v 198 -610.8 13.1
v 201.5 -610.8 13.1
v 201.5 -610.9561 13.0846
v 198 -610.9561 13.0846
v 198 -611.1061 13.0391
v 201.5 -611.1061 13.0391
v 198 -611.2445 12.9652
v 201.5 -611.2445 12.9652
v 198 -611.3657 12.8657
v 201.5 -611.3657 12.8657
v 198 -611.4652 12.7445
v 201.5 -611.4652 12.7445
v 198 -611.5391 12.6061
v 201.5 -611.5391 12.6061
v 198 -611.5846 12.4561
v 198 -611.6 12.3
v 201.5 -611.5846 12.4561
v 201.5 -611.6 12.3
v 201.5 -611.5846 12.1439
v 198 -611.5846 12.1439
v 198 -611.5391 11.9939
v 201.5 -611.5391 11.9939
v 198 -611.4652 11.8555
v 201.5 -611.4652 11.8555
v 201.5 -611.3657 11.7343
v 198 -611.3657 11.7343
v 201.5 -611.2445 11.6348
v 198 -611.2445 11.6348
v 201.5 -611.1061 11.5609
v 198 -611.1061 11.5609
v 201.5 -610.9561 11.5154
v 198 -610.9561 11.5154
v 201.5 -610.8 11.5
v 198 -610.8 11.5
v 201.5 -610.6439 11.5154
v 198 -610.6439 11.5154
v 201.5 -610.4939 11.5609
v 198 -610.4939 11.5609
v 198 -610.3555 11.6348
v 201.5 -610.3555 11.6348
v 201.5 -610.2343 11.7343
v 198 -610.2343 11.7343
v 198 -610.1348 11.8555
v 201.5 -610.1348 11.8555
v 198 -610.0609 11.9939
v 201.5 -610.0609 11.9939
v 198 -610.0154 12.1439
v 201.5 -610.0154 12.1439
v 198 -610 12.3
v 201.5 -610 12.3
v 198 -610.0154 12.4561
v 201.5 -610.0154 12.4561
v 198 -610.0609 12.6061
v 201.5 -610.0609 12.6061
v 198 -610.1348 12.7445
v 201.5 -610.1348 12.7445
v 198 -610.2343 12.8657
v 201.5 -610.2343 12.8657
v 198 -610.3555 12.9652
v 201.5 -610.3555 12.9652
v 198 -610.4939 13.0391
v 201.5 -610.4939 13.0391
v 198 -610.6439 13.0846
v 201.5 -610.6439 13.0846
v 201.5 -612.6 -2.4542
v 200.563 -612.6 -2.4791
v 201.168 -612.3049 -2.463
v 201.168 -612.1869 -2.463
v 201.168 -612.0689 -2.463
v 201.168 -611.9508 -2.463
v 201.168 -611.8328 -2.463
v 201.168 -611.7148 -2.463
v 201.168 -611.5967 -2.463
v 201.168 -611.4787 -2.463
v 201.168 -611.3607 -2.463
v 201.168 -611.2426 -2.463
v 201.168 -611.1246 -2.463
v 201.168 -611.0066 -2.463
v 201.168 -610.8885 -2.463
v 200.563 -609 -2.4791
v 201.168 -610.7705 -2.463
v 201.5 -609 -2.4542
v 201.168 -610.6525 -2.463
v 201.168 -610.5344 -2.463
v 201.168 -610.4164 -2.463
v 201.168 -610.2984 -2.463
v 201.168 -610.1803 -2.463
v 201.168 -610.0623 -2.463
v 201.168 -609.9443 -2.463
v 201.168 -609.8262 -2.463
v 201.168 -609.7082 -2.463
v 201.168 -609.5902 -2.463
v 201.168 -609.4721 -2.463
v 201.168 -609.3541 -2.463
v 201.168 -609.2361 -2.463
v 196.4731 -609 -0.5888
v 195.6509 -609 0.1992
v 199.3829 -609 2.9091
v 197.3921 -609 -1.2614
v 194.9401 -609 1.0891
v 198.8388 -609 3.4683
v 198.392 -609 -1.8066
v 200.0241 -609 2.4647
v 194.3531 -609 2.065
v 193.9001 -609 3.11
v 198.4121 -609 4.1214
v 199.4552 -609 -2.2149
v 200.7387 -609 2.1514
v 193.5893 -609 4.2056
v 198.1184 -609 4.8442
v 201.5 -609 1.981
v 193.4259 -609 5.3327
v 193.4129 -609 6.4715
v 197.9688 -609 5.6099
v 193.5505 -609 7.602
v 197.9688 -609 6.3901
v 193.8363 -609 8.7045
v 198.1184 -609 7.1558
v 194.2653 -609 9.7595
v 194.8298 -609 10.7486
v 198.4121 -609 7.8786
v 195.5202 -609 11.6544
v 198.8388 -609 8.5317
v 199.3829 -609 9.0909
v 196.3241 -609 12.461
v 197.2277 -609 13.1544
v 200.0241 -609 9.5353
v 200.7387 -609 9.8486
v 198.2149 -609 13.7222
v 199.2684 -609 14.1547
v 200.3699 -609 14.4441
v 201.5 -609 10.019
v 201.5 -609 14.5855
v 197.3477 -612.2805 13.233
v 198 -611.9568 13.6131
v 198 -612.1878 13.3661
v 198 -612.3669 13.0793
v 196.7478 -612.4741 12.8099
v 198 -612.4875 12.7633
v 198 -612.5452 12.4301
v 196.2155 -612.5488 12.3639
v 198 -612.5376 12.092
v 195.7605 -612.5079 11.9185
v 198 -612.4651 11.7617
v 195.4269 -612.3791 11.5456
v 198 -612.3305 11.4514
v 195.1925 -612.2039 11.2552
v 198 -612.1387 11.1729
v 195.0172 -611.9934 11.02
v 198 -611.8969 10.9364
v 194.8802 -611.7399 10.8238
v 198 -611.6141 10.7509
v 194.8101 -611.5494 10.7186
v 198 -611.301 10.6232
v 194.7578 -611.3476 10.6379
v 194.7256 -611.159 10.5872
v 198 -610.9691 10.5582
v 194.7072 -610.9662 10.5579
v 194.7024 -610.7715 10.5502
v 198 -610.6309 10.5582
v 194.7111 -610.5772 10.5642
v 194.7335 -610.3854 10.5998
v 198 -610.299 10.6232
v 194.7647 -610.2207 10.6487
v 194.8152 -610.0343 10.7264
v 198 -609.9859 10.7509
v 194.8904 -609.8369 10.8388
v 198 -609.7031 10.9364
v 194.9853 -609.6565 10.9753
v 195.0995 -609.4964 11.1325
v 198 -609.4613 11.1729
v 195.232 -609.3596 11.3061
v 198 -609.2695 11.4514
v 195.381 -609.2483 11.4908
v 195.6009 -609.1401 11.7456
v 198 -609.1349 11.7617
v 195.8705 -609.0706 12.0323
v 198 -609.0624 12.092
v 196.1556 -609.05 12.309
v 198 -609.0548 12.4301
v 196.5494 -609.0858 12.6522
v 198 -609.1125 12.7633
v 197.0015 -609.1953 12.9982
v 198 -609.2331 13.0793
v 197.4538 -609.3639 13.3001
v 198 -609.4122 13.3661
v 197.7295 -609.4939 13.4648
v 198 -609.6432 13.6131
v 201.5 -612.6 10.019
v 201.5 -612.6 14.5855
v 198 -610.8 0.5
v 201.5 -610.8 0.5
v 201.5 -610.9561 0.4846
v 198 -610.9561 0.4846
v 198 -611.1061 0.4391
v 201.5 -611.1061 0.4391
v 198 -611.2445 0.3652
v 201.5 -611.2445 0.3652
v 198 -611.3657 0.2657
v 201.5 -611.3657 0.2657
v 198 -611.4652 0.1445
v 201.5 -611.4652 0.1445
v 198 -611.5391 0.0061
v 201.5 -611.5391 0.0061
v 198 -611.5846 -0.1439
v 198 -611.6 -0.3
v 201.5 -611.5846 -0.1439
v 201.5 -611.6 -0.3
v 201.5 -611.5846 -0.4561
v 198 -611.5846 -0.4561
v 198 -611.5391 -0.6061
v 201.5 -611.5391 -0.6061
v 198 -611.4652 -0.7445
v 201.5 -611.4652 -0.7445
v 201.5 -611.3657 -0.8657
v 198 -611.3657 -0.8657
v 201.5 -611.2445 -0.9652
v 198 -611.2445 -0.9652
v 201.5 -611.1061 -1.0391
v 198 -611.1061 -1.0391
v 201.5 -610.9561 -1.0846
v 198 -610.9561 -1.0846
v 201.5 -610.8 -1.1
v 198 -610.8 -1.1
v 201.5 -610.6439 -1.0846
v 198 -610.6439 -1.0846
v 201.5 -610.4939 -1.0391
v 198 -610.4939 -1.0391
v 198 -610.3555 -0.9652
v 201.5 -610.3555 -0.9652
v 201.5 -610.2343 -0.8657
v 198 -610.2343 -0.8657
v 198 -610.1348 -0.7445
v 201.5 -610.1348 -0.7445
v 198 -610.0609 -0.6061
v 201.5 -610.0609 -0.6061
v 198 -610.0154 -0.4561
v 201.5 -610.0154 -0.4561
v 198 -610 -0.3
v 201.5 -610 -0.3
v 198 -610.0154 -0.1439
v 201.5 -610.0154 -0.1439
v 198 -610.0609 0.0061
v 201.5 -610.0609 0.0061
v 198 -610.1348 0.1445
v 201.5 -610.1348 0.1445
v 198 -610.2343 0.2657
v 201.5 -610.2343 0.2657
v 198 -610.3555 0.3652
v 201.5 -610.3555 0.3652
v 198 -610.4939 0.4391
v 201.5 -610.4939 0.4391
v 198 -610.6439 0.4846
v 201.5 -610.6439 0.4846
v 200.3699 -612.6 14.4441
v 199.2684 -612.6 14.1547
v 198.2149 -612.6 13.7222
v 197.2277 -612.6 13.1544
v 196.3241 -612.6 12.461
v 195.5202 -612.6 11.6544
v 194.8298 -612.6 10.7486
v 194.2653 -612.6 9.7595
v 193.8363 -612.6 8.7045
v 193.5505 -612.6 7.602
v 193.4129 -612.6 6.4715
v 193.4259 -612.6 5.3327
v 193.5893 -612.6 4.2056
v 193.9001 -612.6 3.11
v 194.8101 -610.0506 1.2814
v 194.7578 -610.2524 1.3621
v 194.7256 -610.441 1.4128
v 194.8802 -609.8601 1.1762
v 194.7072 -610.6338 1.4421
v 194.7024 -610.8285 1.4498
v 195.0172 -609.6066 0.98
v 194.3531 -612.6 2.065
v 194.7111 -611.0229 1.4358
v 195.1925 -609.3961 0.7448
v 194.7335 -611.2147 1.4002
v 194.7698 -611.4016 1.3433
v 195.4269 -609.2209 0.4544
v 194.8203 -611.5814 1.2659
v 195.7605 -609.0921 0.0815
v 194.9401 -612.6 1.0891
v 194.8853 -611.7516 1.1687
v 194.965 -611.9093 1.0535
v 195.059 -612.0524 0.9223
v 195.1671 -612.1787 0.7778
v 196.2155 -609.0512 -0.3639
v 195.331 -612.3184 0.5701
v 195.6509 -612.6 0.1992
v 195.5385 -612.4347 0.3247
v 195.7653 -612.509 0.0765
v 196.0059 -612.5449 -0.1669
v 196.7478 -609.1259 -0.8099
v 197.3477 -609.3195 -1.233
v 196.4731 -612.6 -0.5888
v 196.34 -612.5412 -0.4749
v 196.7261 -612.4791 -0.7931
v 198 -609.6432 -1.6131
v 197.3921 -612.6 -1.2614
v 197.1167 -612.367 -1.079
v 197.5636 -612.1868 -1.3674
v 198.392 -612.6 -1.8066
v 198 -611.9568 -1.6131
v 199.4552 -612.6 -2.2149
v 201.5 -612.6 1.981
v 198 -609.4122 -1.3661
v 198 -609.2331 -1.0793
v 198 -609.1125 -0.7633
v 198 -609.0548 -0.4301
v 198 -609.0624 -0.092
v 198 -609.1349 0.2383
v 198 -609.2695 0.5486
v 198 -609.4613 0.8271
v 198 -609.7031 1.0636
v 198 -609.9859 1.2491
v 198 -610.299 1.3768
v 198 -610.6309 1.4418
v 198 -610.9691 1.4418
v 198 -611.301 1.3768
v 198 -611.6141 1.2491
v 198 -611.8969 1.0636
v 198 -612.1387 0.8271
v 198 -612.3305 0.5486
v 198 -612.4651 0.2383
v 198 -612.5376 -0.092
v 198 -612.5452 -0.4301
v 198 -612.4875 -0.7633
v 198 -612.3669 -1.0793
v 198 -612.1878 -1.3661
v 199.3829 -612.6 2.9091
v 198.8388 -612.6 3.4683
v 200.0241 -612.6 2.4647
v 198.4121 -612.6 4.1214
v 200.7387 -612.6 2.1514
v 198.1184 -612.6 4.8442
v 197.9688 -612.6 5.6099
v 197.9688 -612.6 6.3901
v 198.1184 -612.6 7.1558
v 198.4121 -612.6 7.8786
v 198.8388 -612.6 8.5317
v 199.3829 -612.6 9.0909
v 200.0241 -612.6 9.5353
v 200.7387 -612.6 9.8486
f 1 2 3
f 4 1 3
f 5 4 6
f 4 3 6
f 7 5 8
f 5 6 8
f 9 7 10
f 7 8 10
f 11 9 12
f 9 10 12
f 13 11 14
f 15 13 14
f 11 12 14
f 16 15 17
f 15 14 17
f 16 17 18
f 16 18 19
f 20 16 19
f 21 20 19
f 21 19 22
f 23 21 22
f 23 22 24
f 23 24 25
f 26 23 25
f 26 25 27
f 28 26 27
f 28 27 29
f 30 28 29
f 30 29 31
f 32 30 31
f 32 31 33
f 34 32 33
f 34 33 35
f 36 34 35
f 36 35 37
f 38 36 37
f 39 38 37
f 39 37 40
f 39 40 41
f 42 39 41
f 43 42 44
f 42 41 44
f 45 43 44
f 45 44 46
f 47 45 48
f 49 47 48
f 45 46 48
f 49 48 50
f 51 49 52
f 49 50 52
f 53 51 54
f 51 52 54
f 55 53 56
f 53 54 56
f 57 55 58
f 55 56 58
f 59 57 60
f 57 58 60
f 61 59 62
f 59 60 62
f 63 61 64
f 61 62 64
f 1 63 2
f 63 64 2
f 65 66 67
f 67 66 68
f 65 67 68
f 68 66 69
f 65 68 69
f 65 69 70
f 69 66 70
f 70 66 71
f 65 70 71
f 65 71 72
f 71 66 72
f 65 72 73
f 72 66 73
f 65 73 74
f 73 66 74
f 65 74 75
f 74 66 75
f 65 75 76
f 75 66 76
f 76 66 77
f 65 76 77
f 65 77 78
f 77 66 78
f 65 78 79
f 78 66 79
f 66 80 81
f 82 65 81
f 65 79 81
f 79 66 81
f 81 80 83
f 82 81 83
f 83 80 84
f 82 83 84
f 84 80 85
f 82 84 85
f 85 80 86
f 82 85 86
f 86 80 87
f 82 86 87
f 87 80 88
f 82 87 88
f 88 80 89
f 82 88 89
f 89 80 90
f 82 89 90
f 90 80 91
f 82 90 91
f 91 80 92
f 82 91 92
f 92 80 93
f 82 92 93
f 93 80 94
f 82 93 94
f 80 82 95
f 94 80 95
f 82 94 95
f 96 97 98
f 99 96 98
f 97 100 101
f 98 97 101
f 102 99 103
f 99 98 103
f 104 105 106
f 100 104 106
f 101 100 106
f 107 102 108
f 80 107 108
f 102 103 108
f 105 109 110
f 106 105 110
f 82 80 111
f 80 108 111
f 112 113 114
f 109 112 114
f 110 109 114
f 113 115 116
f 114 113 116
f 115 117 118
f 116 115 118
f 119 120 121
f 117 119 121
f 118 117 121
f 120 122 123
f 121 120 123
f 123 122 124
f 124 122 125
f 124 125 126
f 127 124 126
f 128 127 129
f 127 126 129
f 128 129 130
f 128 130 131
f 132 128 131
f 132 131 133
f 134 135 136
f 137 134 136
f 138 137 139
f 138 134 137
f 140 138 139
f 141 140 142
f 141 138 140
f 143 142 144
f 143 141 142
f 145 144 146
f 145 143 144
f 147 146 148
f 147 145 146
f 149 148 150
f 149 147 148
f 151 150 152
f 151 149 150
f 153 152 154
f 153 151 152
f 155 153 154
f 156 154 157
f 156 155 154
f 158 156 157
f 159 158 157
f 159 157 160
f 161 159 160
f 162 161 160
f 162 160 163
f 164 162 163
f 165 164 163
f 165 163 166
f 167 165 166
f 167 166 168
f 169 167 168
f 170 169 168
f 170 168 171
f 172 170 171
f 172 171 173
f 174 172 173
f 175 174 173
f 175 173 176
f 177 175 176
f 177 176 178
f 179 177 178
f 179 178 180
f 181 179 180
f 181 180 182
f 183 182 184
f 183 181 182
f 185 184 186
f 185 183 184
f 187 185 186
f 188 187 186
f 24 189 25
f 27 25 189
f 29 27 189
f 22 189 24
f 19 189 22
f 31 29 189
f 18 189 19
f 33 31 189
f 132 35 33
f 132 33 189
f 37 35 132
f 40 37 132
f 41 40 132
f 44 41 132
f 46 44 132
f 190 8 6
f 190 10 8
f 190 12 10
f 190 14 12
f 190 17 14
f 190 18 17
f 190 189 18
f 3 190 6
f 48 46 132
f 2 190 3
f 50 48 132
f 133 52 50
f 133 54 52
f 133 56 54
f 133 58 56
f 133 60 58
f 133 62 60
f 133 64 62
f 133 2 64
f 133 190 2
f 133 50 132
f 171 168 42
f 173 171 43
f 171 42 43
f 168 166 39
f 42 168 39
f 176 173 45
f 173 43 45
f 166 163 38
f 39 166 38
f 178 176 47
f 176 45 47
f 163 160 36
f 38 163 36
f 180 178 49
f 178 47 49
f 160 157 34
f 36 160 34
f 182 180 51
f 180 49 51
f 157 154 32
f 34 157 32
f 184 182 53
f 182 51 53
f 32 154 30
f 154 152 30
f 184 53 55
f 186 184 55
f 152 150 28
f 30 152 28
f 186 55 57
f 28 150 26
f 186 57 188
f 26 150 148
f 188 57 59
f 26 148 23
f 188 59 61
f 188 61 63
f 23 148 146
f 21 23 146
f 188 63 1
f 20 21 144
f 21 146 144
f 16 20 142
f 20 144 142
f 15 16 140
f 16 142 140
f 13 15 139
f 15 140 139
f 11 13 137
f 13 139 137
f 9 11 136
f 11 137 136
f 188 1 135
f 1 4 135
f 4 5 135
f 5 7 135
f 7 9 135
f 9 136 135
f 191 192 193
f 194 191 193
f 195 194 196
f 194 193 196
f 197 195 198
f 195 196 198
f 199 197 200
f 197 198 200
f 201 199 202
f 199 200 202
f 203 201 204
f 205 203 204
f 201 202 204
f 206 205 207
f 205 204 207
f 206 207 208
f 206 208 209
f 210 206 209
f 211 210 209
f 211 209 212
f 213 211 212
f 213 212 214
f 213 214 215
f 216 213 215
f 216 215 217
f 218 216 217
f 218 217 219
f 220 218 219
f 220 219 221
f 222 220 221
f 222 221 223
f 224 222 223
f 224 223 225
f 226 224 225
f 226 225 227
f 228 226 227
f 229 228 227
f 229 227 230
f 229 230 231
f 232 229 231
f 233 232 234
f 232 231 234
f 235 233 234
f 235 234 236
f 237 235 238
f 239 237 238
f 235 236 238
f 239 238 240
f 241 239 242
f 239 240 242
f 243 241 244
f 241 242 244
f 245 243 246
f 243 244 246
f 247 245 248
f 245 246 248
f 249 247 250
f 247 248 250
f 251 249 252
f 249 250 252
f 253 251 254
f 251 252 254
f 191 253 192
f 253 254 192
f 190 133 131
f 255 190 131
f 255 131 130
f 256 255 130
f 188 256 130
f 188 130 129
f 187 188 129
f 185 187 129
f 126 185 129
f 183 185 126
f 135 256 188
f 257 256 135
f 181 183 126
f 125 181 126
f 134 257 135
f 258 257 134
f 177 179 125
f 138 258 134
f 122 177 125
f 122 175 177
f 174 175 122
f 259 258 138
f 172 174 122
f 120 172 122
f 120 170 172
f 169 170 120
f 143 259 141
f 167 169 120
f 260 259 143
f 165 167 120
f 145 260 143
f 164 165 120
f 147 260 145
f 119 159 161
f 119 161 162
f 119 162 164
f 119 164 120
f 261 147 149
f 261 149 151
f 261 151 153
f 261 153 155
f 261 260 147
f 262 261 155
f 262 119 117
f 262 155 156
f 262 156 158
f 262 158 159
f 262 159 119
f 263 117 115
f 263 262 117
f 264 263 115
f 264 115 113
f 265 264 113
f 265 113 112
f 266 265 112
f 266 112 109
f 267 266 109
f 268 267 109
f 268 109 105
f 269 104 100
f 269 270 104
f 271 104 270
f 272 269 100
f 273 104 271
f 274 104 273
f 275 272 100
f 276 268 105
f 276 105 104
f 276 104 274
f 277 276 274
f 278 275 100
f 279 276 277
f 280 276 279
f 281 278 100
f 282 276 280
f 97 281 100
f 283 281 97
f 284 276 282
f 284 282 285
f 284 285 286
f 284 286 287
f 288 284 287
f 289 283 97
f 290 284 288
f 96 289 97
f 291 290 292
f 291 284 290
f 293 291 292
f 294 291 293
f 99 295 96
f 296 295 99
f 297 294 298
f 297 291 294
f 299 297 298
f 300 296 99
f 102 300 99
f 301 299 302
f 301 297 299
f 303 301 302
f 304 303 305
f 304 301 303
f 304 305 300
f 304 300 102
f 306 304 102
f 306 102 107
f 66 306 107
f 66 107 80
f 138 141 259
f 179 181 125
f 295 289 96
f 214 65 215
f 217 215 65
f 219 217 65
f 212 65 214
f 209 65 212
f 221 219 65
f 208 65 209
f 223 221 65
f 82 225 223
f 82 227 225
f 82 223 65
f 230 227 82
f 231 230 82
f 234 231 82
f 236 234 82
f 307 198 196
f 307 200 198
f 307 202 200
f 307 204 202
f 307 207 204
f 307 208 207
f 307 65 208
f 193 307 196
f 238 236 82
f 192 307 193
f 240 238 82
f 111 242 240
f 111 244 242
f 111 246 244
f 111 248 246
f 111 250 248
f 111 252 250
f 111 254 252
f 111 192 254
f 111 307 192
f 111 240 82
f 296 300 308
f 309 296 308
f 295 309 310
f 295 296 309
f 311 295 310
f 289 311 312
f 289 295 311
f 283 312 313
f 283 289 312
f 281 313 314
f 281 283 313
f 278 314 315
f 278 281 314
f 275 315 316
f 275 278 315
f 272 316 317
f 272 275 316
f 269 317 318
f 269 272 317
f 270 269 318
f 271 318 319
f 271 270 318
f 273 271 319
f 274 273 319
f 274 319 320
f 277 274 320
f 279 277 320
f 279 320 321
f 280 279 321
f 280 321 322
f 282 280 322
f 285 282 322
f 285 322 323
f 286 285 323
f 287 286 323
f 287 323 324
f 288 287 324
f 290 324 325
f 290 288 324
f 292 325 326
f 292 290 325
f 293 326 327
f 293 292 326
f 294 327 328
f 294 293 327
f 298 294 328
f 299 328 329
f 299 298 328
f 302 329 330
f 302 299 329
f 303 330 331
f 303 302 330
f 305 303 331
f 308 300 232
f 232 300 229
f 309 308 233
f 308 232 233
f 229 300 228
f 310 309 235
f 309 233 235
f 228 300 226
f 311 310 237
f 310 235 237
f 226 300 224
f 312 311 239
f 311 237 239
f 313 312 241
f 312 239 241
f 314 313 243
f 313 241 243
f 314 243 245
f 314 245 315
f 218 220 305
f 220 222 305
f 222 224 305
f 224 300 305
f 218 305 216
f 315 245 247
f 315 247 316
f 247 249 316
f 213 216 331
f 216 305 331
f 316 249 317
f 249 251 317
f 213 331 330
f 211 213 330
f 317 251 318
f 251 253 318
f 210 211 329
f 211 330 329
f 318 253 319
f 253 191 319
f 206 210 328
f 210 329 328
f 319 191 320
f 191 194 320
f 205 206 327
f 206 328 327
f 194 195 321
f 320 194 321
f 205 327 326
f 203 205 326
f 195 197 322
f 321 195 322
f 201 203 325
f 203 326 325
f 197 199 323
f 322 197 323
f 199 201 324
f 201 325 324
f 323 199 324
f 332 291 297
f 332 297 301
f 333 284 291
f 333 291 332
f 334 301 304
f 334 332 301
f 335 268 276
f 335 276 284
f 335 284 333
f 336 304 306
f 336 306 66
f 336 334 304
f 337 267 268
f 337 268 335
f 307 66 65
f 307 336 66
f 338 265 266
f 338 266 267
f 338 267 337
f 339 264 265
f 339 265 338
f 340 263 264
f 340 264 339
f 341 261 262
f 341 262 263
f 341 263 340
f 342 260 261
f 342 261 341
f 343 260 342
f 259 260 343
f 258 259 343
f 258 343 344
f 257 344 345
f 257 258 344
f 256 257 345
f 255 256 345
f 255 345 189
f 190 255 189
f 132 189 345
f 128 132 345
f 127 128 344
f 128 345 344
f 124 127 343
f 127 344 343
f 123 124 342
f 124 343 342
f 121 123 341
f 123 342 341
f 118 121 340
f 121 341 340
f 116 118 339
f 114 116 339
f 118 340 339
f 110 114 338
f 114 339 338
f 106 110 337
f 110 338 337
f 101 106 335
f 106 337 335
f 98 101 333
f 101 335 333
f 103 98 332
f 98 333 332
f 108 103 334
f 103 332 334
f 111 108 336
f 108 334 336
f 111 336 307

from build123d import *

# Parameters (mm, degrees)
PAD114_DEPTH    = 3.6
SKETCH245_W     = 199.954956
SKETCH245_H     = 336.690071
POCKET129_DEPTH = 50
POCKET130_DEPTH = 300
SKETCH247_R     = 4.05
POCKET131_DEPTH = 5
SKETCH248_R     = 0.8
POCKET132_DEPTH = 10
SKETCH249_R     = 1.75
POCKET133_DEPTH = 4.5


with BuildPart() as part:
    # Sketch244 → Pad114 (new body)
    with BuildSketch(Plane.XZ):
        with BuildLine():
            add(Edge.make_bspline(
                [(299.999063, 0.026825), (299.662766, 0.037193), (298.339429, 0.190401), (295.439956, 0.589669), (290.775356, 1.337839), (284.500044, 2.393262), (276.735212, 3.66473), (267.577355, 5.083019), (257.136483, 6.653879), (245.549215, 8.381993), (232.975291, 10.222771), (219.590016, 12.153256), (205.573823, 14.115503), (191.111579, 16.055183), (176.381713, 17.897983), (161.544489, 19.553409), (146.739309, 20.940939), (132.087536, 21.99009), (117.705275, 22.664279), (103.703346, 22.961168), (90.192549, 22.858072), (77.284675, 22.375726), (65.094168, 21.544938), (53.730431, 20.369385), (43.29002, 18.857963), (33.852484, 17.043697), (25.485501, 14.967735), (18.252292, 12.67281), (12.179436, 10.224412), (7.338355, 7.689021), (3.623023, 5.152403), (1.3546, 2.748114), (-0.314638, 0.590402), (0.575789, -1.804065), (3.482069, -2.72942), (7.386052, -3.91761), (13.030922, -4.754284), (20.096342, -5.463024), (28.645402, -5.933379), (38.56853, -6.201185), (49.790194, -6.284208), (62.196701, -6.193111), (75.660953, -5.967607), (90.034637, -5.629522), (105.153445, -5.226063), (120.83724, -4.775199), (136.895942, -4.296045), (153.13493, -3.818601), (169.356828, -3.345106), (185.36574, -2.889379), (200.968742, -2.465331), (215.974941, -2.074889), (230.201502, -1.715375), (243.47905, -1.394255), (255.639348, -1.103787), (266.55871, -0.849968), (276.034544, -0.603524), (284.209012, -0.340437), (290.324953, -0.117215), (295.955653, 0.018504), (297.364702, 0.013759), (300.343856, 0.01512), (300.000055, 0.026794), (299.999063, 0.026825)],
                knots=[0, 0, 0, 0, 1.017748, 3.99659, 8.779341, 15.189917, 23.087031, 32.383824, 42.990765, 54.76218, 67.530065, 81.114584, 95.333435, 109.988542, 124.889458, 139.866624, 154.774633, 169.496697, 183.930349, 197.964304, 211.506735, 224.45797, 236.709214, 248.156653, 258.723012, 268.346769, 276.97692, 284.567784, 291.102108, 296.573756, 300.992679, 304.39163, 306.761357, 308.43213, 311.131254, 315.298227, 320.951765, 328.080828, 336.654655, 346.609821, 357.866231, 370.316475, 383.83025, 398.264023, 413.449345, 429.202773, 445.334827, 461.646891, 477.940787, 494.021253, 509.693044, 524.767168, 539.054704, 552.387642, 564.607107, 575.560217, 585.109622, 593.180747, 599.700326, 604.53767, 607.540683, 608.560842, 608.563842, 608.563842, 608.563842, 608.563842], degree=3))
        make_face()
    extrude(amount=PAD114_DEPTH)

    # Sketch245 → Pocket129 (cut, symmetric)
    with BuildSketch(Plane.XY):
        with Locations((301.477478, -150.975887)):
            Rectangle(SKETCH245_W, SKETCH245_H)
    extrude(amount=POCKET129_DEPTH, both=True, mode=Mode.SUBTRACT)

    # Sketch246 (on Face4 of Pocket129) → Pocket130 (cut)
    with BuildSketch(Plane.XZ.offset(3.6)):
        with BuildLine():
            ThreePointArc((202, 14.6), (193.4, 6), (202, -2.6))
            Line((213.747525, -30.946017), (202, -2.6))
            Line((-22.89874, -30.946017), (213.747525, -30.946017))
            Line((-27.727513, 31.780215), (-22.89874, -30.946017))
            Line((188.968875, 46.453211), (-27.727513, 31.780215))
            Line((202, 14.6), (188.968875, 46.453211))
        make_face()
    extrude(amount=-POCKET130_DEPTH, mode=Mode.SUBTRACT)

    # Sketch247 (on Face4 of Pocket130) → Pocket131 (cut)
    with BuildSketch(Plane.XZ.offset(3.6)):
        with Locations((202, 6)):
            Circle(SKETCH247_R)
    extrude(amount=-POCKET131_DEPTH, mode=Mode.SUBTRACT)

    # Sketch248 (on Face7 of Pocket131) → Pocket132 (cut)
    with BuildSketch(Plane(origin=(201.5, 0, 0), x_dir=(0, 0, 1), z_dir=(1, 0, 0))):
        with Locations((12.3, 1.8)):
            Circle(SKETCH248_R)
        with Locations((-0.3, 1.8)):
            Circle(SKETCH248_R)
    extrude(amount=-POCKET132_DEPTH, mode=Mode.SUBTRACT)

    # Sketch249 (on DatumPlane) → Pocket133 (cut)
    with BuildSketch(Plane(origin=(193.5, 0, 0), x_dir=(0, 0, 1), z_dir=(1, 0, 0))):
        with Locations((12.3, 1.8)):
            Circle(SKETCH249_R)
        with Locations((-0.3, 1.8)):
            Circle(SKETCH249_R)
    extrude(amount=POCKET133_DEPTH, mode=Mode.SUBTRACT)


with BuildPart() as part_1:
    # Body047 placement: moved
    add(part.part.moved(Location((0, -609, 0))))


solid = part_1.part
